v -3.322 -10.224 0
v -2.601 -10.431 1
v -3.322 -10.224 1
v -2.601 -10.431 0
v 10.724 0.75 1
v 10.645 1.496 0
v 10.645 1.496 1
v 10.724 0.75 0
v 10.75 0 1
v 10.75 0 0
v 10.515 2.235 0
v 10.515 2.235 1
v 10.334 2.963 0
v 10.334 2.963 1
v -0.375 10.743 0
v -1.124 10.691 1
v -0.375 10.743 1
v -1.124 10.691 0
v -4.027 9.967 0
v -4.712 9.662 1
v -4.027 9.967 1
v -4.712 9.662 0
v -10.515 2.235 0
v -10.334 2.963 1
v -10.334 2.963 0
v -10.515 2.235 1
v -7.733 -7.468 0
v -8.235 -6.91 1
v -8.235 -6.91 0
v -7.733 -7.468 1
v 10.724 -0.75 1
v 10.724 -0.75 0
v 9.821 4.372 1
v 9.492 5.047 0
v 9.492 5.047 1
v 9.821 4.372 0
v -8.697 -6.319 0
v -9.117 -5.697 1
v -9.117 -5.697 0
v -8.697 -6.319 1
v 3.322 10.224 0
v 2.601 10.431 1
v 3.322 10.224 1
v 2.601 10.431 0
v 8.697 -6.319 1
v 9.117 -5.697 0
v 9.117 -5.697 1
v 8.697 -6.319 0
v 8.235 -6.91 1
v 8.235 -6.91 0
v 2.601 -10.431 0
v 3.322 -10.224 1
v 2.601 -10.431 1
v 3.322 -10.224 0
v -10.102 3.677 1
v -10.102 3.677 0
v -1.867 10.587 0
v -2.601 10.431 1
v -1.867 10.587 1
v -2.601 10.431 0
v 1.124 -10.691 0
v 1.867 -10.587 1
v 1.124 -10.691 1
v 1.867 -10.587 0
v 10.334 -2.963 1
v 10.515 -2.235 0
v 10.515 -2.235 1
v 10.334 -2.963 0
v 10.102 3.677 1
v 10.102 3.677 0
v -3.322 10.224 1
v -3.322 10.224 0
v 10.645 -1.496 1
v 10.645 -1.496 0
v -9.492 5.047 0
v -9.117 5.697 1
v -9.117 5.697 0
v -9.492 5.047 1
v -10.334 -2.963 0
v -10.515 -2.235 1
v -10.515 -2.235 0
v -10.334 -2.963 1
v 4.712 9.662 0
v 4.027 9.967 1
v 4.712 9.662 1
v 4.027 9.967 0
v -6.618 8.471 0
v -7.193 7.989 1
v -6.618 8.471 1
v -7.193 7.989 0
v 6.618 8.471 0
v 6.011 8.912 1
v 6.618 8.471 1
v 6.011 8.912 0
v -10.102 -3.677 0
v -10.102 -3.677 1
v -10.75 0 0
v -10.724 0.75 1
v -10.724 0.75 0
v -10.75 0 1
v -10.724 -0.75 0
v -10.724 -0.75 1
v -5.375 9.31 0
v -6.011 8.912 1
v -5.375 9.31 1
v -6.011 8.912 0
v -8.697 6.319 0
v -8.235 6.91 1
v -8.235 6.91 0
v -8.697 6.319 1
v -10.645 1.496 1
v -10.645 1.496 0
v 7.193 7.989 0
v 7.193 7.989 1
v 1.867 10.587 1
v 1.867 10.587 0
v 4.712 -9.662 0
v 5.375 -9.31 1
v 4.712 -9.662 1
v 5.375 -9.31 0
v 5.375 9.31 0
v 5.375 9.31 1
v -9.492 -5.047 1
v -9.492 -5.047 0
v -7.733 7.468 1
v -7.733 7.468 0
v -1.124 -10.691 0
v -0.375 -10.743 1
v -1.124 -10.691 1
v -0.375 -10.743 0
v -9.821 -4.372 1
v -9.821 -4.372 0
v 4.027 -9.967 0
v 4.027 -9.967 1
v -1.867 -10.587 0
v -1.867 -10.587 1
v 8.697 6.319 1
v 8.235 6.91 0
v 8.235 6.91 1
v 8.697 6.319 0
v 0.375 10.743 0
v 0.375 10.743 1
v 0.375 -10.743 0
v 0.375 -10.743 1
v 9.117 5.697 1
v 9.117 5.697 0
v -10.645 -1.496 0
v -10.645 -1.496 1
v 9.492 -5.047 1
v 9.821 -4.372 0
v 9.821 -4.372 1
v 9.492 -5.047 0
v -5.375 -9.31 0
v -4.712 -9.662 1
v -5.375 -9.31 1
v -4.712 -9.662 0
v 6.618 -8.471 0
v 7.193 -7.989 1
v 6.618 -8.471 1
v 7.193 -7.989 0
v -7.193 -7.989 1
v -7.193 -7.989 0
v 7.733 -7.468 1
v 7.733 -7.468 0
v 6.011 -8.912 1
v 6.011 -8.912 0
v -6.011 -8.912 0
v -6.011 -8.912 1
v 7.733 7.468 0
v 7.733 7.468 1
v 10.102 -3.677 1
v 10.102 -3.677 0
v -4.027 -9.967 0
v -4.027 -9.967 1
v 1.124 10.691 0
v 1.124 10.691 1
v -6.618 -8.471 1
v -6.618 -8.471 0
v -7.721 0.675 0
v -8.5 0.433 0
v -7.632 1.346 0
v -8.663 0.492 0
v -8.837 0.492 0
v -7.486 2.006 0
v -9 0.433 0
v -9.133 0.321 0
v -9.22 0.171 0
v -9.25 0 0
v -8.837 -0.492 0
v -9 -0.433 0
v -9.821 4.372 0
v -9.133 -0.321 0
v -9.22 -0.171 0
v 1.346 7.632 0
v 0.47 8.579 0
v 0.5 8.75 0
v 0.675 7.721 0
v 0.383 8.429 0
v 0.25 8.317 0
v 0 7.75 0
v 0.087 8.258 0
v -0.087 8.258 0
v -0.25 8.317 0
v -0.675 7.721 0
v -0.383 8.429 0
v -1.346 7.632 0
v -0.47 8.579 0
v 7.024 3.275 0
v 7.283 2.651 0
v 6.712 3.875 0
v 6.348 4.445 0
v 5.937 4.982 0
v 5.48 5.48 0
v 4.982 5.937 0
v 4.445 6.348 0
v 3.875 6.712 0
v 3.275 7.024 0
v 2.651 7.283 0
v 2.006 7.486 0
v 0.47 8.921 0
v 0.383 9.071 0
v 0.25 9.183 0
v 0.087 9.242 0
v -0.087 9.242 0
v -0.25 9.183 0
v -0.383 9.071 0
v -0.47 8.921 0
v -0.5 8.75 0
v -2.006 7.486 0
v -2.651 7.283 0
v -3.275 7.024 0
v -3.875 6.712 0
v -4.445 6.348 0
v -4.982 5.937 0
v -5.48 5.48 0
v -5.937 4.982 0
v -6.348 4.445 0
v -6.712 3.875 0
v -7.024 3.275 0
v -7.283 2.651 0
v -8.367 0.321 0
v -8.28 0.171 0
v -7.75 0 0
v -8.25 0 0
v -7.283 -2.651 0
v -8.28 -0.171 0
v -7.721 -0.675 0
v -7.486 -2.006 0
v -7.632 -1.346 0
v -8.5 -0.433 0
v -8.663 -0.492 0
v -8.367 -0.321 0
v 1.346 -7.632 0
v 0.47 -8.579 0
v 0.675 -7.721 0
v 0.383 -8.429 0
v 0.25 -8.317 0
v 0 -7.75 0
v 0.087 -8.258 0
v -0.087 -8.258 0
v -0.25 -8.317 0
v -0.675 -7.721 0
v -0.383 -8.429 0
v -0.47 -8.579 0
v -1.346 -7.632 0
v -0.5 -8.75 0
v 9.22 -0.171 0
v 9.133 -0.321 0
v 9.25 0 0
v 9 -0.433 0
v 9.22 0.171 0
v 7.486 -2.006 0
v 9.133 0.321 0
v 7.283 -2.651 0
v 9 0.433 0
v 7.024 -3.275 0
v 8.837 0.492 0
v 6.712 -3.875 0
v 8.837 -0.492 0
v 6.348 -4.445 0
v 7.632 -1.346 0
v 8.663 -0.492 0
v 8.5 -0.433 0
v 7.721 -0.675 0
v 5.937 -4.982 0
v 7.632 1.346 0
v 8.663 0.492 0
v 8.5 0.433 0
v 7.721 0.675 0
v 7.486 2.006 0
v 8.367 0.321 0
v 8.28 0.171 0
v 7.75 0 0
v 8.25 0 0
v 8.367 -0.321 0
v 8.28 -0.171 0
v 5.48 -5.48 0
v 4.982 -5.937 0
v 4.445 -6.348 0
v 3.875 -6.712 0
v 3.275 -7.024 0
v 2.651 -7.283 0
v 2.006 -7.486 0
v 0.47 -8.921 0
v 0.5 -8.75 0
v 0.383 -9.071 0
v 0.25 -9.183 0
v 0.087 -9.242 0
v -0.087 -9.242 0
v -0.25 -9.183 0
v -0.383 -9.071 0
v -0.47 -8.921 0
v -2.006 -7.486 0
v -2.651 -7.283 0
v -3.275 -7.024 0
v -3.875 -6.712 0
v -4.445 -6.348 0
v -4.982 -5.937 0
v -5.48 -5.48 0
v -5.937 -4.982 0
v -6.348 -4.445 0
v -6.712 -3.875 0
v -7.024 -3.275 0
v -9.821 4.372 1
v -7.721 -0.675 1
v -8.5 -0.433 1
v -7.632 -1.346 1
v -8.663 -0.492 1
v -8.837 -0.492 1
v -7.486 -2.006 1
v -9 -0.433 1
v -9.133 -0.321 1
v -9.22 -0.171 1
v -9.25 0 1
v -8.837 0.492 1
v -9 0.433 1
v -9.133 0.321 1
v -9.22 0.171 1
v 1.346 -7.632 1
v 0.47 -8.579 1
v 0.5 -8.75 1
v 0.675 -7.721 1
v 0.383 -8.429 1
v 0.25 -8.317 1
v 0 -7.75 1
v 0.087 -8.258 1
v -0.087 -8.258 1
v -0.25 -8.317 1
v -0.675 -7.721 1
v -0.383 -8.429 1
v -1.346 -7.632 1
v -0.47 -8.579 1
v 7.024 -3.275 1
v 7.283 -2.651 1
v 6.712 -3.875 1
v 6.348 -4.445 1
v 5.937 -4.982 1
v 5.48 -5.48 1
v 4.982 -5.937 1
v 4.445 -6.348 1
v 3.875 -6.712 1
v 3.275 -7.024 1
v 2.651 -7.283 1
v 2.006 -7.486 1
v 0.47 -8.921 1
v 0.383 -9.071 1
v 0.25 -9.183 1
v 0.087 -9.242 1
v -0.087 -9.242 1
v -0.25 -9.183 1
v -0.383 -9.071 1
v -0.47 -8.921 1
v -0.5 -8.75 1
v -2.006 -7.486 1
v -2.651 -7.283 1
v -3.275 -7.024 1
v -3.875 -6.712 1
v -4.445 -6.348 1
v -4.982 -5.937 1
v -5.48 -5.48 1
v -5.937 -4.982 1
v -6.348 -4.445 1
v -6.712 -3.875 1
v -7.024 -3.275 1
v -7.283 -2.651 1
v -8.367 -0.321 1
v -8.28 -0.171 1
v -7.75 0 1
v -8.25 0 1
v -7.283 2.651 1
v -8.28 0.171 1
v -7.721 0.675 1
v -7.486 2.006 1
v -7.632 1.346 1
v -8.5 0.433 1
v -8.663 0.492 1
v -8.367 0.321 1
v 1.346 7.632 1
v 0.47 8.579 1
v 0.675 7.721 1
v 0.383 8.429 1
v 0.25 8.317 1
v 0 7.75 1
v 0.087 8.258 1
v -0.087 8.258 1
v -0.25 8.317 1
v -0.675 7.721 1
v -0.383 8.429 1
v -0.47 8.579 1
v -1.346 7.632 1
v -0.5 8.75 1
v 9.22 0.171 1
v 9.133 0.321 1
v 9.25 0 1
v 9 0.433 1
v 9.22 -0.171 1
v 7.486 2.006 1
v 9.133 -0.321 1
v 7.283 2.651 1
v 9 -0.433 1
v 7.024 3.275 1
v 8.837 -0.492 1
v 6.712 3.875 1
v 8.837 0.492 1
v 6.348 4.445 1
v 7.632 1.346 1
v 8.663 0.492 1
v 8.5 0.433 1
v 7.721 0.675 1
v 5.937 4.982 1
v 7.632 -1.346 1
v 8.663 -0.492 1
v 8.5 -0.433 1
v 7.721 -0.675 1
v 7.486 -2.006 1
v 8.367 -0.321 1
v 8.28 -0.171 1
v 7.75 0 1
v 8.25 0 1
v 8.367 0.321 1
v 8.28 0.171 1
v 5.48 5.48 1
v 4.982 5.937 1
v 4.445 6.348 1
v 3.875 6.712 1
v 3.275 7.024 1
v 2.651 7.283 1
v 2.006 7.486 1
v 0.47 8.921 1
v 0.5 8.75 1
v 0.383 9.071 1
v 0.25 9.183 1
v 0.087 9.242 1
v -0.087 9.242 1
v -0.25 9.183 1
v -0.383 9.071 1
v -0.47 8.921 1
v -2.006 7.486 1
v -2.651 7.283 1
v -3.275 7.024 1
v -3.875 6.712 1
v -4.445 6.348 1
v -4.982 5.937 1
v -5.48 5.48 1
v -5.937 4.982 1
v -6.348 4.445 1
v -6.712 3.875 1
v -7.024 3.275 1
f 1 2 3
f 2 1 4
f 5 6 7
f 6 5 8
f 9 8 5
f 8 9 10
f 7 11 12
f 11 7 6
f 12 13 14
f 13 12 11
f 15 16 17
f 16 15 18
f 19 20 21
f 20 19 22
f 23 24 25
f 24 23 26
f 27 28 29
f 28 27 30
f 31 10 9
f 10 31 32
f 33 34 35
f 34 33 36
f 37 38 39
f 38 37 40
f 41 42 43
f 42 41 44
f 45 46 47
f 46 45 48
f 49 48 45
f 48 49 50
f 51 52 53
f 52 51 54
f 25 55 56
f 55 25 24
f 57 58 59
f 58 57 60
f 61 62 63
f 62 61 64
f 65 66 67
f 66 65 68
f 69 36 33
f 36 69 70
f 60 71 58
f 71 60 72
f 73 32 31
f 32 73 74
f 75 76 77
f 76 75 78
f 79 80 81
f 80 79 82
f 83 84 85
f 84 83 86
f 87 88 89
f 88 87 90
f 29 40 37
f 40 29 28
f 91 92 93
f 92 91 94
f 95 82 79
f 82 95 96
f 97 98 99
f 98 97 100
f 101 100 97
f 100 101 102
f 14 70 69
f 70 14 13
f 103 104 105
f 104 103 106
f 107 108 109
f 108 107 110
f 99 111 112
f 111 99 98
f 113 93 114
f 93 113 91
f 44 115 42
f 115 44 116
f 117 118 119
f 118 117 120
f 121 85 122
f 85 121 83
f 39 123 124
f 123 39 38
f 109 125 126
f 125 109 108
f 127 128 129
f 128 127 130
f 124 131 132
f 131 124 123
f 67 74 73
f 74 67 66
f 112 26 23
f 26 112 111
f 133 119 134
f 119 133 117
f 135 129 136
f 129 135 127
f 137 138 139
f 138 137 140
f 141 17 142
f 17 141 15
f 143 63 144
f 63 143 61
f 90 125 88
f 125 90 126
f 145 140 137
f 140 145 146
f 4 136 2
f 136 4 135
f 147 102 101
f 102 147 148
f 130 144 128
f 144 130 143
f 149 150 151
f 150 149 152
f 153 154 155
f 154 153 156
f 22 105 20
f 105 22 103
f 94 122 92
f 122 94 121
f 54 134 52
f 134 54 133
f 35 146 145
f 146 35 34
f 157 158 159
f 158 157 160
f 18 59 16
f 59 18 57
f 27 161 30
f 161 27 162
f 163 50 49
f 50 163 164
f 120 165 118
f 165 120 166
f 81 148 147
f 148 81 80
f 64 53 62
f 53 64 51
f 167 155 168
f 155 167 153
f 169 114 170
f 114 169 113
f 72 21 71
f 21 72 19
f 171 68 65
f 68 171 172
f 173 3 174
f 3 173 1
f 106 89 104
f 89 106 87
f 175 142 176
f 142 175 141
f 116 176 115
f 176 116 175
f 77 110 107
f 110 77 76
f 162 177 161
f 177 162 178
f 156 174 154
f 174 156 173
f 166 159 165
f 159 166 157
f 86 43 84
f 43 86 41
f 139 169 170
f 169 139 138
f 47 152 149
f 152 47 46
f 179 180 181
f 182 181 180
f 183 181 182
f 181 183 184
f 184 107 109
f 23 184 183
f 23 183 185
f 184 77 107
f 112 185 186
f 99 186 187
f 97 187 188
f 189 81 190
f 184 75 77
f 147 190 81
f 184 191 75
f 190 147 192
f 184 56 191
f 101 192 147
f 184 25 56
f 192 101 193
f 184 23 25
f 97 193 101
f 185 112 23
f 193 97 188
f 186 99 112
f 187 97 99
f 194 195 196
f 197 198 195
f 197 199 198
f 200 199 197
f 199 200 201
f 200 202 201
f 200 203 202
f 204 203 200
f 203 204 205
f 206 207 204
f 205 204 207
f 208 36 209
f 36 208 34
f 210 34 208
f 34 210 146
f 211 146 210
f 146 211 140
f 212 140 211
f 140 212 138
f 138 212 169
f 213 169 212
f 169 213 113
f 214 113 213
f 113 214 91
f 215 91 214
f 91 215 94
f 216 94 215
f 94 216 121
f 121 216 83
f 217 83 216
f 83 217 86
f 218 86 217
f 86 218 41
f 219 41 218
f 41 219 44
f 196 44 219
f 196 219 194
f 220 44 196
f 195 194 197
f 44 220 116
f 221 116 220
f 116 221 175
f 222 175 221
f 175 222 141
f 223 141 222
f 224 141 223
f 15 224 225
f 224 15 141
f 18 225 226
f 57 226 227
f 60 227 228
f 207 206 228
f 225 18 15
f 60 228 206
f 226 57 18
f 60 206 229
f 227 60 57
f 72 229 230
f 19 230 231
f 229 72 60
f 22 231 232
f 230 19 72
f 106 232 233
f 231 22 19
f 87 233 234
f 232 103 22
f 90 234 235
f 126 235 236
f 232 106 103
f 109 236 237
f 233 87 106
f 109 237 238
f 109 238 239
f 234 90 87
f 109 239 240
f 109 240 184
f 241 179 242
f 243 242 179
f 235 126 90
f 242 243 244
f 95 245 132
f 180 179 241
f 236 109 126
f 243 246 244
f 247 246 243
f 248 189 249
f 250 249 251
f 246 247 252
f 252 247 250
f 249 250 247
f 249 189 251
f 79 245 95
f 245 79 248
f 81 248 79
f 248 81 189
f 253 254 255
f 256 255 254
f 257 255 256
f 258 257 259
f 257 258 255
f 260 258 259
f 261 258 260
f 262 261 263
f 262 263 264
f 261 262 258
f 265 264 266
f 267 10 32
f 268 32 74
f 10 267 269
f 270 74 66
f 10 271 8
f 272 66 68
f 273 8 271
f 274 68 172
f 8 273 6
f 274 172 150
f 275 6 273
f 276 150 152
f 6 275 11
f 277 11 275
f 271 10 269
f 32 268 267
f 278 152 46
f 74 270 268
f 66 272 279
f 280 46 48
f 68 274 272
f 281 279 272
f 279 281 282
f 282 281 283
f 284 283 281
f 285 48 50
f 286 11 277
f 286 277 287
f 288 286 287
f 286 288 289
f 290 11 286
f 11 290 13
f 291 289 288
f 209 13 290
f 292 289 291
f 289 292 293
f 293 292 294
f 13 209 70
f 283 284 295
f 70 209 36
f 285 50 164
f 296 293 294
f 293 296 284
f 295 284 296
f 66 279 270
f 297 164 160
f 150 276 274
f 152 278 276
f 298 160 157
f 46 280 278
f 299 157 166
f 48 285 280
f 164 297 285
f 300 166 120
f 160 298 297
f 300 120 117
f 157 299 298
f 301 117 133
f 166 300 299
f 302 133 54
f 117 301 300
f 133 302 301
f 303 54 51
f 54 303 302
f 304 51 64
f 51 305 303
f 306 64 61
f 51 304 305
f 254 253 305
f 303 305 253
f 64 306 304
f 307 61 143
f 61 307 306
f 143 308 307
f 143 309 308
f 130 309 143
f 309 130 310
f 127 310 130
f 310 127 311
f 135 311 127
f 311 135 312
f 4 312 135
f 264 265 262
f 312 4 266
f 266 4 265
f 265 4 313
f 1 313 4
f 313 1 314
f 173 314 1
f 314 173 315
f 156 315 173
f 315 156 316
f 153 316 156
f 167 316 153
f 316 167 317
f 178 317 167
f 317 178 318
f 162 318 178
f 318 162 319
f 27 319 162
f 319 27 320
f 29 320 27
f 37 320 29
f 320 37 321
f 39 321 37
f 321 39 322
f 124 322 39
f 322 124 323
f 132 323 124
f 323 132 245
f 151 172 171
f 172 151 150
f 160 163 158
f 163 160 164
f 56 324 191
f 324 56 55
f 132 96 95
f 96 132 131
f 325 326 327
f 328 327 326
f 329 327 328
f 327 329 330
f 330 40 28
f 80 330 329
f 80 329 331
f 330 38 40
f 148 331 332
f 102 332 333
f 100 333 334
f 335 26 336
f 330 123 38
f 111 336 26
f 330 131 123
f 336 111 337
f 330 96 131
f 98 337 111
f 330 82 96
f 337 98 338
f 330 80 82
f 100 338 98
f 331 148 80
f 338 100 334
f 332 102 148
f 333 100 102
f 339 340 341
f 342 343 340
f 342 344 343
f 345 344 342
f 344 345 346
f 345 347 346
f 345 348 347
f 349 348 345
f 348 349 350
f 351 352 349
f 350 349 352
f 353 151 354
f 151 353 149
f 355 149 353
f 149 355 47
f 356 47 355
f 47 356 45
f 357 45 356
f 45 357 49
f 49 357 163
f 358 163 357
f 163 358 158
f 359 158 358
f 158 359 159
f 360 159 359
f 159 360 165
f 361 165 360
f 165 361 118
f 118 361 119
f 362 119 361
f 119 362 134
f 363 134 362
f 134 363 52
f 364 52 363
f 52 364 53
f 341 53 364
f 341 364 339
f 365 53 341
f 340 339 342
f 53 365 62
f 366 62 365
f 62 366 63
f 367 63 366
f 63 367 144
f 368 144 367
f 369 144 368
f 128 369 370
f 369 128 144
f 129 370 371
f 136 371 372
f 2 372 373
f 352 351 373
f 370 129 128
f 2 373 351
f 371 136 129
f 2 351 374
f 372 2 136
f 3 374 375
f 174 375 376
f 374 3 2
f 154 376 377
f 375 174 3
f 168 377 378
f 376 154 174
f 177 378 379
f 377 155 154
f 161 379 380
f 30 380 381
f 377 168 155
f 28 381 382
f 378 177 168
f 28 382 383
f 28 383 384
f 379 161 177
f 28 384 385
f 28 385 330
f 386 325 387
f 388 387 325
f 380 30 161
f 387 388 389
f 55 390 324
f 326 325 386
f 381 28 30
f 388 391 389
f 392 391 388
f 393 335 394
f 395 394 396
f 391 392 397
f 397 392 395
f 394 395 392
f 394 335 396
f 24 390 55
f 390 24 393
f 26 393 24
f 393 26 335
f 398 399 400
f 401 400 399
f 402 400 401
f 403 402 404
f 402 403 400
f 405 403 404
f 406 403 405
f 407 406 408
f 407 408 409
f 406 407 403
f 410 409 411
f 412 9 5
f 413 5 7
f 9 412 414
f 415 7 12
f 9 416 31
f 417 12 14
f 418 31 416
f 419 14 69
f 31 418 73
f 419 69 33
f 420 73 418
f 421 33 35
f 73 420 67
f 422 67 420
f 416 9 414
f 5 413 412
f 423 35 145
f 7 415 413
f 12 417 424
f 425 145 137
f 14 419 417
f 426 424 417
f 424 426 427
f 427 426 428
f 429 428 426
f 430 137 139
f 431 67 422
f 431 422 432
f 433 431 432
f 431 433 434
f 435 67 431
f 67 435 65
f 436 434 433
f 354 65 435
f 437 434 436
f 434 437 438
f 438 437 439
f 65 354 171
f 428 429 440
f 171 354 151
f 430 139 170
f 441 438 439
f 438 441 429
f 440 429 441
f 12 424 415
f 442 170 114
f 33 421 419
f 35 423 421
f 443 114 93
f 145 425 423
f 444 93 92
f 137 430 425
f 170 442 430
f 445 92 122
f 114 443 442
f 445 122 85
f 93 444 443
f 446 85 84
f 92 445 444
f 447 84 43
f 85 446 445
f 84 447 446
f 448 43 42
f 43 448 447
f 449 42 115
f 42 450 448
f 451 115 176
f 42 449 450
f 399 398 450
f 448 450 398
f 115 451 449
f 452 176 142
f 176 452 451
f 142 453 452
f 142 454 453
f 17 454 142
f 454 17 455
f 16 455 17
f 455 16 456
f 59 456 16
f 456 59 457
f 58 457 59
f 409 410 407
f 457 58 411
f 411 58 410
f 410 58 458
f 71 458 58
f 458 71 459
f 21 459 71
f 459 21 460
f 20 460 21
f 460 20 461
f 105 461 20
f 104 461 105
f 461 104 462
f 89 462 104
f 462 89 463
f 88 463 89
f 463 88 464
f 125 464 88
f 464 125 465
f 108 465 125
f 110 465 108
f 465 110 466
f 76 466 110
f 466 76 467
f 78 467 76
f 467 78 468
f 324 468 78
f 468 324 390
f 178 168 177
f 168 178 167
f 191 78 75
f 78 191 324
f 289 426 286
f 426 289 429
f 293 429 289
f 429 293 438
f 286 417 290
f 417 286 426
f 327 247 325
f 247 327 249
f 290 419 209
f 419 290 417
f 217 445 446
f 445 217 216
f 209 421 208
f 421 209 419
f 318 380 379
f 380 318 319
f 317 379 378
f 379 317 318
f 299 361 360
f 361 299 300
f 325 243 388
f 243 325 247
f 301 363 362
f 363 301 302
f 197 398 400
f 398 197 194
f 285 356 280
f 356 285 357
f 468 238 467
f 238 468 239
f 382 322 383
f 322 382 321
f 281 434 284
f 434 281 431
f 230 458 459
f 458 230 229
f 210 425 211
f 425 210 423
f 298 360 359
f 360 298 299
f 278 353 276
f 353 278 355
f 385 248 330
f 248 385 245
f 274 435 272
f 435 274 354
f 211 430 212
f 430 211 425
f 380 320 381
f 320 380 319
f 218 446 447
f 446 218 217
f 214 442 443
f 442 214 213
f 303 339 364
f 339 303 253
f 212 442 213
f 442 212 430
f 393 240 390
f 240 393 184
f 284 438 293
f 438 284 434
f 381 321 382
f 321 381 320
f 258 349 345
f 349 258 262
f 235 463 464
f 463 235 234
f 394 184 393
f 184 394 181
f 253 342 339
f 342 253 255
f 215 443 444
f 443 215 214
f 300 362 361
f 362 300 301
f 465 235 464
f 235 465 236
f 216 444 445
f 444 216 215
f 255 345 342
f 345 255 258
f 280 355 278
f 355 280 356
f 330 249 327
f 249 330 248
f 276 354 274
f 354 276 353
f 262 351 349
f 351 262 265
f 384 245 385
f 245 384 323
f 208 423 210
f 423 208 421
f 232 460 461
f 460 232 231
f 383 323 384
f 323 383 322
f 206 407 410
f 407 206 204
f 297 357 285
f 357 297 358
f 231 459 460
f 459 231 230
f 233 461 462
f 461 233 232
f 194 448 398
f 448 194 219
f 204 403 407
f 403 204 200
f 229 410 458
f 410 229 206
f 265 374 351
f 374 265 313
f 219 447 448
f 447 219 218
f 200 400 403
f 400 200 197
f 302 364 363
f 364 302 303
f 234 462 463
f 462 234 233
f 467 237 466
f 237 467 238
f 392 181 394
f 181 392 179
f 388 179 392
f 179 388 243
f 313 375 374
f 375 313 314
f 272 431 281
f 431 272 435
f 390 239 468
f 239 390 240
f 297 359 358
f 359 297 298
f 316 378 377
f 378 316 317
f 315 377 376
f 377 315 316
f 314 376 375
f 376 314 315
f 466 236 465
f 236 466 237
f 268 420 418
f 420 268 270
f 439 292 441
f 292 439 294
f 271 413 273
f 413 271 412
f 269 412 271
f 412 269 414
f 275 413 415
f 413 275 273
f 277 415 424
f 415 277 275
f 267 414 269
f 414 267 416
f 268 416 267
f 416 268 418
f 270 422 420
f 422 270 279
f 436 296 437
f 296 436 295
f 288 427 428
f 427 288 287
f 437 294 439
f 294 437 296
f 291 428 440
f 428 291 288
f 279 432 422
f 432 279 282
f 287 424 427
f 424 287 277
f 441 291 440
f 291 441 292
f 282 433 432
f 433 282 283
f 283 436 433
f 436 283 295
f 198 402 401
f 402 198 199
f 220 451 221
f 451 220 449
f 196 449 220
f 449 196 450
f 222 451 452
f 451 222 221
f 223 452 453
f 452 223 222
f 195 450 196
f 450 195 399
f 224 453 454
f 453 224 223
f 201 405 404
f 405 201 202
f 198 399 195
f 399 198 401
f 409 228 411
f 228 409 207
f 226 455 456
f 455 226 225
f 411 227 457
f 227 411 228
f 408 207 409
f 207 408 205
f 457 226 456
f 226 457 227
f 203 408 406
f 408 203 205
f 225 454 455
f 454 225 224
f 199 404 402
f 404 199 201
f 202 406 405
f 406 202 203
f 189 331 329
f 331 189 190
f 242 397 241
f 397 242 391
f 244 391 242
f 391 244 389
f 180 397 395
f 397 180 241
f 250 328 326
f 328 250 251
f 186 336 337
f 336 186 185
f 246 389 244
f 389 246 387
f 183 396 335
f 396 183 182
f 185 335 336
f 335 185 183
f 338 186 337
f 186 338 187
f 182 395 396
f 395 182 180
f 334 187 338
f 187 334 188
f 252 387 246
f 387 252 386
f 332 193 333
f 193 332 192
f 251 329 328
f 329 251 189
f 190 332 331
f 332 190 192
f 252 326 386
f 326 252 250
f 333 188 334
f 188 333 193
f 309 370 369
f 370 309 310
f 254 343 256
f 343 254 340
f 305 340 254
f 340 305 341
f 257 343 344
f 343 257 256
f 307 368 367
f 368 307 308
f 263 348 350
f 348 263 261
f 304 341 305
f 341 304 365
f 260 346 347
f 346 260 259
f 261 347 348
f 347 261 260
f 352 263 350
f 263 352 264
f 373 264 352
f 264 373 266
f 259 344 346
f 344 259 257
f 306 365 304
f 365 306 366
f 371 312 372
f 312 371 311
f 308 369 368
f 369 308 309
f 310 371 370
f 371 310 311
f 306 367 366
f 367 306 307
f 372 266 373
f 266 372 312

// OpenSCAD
// part_id: jup19
// name: Jupiter pointer ring inner
// source_drawing_ids: DRW-012
// units: mm
// revision: 0.1
// SPDX-License-Identifier: MIT

module part_jup19(
    outer_d = 21.5,
    inner_d = 15.5,
    thickness = 1.0,
    rivet_d = 1.0,
    rivet_pcd = 17.5,
    rivet_count = 4
) {
    difference() {
        difference() {
            cylinder(d = outer_d, h = thickness, $fn = 90);
            translate([0, 0, -0.05]) cylinder(d = inner_d, h = thickness + 0.1, $fn = 72);
        }
        for (i = [0 : rivet_count - 1]) {
            a = i * 360 / rivet_count;
            translate([(rivet_pcd / 2) * cos(a), (rivet_pcd / 2) * sin(a), -0.1])
                cylinder(d = rivet_d, h = thickness + 0.2, $fn = 18);
        }
    }
}

// ---- "main guard" ----
// Default to previewing when opened directly:
if (is_undef(__LIB_MODE__)) {
    part_jup19();
}
